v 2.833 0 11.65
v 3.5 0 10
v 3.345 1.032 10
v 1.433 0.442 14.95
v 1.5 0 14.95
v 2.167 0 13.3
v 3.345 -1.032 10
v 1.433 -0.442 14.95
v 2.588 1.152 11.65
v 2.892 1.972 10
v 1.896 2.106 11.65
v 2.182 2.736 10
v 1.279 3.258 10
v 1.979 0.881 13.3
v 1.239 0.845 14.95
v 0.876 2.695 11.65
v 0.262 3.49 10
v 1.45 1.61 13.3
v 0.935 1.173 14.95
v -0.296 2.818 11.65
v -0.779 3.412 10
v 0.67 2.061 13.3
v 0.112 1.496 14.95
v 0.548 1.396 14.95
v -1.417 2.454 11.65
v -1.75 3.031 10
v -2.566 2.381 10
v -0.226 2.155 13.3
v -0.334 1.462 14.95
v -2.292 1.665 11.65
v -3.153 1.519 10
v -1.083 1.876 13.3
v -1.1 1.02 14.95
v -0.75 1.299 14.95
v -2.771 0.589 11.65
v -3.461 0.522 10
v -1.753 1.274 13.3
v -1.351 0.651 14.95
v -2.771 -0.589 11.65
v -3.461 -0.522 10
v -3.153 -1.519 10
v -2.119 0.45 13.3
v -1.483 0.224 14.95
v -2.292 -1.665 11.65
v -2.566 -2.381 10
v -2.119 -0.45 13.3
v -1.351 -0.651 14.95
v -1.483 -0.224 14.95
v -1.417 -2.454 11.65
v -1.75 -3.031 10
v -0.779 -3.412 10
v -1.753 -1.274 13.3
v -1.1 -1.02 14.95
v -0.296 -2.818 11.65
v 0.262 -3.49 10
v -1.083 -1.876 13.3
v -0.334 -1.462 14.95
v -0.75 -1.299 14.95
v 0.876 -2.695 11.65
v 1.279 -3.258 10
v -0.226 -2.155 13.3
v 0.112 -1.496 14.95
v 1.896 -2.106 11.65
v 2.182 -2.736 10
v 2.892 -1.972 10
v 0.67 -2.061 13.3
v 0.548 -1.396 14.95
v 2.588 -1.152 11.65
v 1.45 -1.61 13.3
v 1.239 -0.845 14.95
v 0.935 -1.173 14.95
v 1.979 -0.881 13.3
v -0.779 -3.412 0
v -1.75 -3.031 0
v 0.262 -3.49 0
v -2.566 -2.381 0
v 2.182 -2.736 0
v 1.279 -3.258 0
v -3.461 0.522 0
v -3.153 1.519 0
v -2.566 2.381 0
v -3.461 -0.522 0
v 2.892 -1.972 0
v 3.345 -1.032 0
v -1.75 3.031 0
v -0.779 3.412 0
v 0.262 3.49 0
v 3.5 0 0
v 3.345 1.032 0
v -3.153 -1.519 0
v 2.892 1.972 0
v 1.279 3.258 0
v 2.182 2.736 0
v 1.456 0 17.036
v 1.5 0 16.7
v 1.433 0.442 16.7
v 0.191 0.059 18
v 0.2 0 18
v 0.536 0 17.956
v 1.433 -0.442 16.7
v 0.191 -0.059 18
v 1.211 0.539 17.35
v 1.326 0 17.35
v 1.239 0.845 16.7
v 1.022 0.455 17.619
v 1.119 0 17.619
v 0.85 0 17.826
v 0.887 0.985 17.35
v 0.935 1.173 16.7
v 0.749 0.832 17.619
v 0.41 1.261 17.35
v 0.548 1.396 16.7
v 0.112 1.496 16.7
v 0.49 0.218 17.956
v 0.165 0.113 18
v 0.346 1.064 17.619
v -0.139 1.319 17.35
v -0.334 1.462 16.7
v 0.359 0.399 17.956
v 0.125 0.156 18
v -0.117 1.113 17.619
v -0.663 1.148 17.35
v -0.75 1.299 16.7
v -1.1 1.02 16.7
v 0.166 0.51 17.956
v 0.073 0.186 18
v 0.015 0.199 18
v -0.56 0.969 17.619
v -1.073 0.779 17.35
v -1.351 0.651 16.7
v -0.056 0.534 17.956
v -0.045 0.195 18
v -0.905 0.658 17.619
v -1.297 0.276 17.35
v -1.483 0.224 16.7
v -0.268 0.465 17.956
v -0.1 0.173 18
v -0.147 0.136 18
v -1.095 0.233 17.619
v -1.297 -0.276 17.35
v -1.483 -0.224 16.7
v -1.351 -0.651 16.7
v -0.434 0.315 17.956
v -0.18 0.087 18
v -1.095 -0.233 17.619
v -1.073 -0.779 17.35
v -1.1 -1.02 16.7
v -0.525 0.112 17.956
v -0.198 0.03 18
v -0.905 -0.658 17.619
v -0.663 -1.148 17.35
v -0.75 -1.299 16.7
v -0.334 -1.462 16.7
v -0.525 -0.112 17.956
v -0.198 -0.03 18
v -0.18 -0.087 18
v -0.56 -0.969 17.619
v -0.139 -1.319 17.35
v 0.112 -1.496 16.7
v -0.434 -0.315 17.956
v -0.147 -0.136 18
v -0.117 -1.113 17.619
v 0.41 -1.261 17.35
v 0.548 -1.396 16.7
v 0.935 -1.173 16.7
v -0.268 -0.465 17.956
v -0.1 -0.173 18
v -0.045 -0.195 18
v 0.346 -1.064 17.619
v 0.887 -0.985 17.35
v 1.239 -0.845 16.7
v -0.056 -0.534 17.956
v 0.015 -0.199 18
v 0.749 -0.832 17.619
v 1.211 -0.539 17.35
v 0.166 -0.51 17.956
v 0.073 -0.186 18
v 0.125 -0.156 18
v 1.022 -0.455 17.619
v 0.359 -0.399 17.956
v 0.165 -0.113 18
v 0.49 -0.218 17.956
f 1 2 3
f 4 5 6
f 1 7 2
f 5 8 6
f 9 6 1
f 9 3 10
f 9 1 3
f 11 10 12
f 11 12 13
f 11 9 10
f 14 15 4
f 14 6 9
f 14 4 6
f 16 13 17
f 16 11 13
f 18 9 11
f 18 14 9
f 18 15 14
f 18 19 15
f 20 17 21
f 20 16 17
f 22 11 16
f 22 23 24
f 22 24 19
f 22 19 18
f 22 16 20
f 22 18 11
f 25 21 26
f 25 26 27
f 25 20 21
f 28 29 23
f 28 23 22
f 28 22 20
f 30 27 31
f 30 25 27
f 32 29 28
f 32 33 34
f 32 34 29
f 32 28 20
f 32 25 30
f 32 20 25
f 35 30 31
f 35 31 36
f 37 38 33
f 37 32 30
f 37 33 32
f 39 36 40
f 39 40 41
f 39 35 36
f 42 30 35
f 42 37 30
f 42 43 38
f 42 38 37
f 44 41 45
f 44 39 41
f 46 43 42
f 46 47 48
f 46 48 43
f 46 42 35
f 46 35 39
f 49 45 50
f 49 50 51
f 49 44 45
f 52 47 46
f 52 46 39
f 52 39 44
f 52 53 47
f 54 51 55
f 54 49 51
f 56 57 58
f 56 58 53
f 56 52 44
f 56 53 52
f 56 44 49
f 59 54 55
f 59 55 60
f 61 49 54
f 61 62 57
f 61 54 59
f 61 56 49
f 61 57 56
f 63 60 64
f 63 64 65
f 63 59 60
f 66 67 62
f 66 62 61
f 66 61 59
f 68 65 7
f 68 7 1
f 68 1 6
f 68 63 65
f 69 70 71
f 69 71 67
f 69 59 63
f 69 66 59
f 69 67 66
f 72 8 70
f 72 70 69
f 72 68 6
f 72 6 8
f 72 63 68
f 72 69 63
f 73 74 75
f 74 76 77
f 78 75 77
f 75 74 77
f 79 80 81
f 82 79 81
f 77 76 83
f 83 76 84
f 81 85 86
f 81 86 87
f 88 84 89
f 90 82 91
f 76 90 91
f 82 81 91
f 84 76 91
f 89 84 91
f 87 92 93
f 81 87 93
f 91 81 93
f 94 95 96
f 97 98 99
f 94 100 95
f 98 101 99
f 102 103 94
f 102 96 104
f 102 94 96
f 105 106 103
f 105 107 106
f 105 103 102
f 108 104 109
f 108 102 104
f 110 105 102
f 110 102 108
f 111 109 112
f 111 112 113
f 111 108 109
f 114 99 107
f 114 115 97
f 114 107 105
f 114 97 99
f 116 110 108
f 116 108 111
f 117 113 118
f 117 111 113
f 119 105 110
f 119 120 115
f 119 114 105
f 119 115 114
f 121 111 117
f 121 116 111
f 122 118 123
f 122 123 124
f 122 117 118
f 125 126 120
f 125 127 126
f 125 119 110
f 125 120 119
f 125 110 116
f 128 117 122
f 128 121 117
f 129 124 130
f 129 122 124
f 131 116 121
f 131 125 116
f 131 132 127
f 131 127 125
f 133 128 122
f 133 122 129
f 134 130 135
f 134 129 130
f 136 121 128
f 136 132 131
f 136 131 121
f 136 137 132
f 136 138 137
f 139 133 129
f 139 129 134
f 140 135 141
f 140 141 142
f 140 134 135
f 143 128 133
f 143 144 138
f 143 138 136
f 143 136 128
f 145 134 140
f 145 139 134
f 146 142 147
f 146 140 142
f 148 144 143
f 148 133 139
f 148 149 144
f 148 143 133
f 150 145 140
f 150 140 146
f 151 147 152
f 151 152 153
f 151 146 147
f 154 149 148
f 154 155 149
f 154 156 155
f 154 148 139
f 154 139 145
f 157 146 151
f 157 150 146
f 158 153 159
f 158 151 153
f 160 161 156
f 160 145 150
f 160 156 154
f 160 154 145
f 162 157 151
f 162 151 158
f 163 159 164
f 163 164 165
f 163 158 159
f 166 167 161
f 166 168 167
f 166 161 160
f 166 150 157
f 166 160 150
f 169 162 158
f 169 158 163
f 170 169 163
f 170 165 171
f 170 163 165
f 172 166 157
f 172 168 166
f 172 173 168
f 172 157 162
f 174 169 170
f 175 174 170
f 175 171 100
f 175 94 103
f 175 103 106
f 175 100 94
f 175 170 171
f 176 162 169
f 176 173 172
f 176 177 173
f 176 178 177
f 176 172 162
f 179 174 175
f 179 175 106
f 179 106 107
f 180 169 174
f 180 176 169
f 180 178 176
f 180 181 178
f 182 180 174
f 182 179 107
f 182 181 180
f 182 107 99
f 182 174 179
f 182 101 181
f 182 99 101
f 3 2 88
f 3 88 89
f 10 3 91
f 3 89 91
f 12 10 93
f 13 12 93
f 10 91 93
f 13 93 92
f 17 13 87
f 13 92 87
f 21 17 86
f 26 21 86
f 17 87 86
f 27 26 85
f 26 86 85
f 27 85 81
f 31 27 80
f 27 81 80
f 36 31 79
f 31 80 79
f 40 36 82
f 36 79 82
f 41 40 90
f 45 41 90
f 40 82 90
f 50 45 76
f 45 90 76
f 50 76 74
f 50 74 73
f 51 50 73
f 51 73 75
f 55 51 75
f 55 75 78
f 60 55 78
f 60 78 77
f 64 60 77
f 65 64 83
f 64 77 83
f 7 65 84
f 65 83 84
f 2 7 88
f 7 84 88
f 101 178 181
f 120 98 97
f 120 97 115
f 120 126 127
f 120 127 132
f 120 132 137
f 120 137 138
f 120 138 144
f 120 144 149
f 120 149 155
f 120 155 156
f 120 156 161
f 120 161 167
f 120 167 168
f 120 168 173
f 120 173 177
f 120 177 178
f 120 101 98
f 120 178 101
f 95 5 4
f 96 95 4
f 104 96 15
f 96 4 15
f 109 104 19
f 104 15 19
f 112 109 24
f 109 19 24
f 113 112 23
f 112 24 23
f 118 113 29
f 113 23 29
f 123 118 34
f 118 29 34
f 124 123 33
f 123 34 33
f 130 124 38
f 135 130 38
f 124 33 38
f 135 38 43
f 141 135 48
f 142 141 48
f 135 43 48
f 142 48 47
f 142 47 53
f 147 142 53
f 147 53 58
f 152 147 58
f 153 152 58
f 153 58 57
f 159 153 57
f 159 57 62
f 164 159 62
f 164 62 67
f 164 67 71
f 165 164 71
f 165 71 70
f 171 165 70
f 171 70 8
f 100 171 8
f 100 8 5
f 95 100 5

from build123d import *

# Parameters (mm, degrees)
F0_R      = 3.5
F0_R_2    = 1.5
F1_DEPTH  = 10
F1_FACE_R = 3.5
F2_DEPTH  = 5
F2_TAPER  = 22
F3_DEPTH  = 18
F4_R      = 1.3


with BuildPart() as f1:
    # F0 (on Top) → F1 (new body)
    with BuildSketch(Plane.XY):
        Circle(F0_R)
        Circle(F0_R_2, mode=Mode.SUBTRACT)
        Circle(F0_R_2)
    extrude(amount=F1_DEPTH)

    # F1_face (on face) → F2 (join)
    with BuildSketch(Plane.XY.offset(10)):
        Circle(F1_FACE_R)
    extrude(amount=F2_DEPTH, taper=F2_TAPER)

    # F0 (on Top) → F3 (join)
    with BuildSketch(Plane.XY):
        Circle(F0_R_2)
    extrude(amount=F3_DEPTH)

    # F4
    f4_edges = [f1.edges().sort_by_distance(p)[0] for p in [
        (-1.5, 0, 18),
    ]]
    fillet(f4_edges, radius=F4_R)


solid = f1.part
